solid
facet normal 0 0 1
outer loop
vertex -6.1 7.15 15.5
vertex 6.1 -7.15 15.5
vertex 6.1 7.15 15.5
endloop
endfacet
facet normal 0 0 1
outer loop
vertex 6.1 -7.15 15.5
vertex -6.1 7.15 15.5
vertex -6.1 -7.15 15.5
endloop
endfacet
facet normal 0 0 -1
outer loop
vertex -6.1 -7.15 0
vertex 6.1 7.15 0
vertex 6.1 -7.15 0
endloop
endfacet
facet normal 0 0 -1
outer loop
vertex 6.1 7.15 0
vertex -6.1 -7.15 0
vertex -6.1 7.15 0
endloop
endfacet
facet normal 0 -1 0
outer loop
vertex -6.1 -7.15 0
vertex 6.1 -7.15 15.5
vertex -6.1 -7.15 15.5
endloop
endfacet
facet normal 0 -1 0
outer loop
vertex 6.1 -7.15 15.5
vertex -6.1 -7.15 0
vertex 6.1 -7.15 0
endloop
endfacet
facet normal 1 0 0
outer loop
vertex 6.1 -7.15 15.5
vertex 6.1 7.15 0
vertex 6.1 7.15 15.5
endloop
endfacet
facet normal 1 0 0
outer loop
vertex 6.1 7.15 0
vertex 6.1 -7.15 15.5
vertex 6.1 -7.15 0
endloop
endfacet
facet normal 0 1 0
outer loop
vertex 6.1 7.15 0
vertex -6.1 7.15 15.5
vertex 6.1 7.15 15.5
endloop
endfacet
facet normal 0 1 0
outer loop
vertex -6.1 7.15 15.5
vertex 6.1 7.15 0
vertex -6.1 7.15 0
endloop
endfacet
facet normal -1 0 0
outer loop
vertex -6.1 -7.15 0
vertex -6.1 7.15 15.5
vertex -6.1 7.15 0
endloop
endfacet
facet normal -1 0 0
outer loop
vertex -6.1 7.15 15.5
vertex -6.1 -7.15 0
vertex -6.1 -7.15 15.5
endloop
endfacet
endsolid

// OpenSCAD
module centered_cube(cube_vector) {
    translate([-cube_vector[0] / 2, -cube_vector[1] / 2, 0]) {
        cube(cube_vector);
    }
}

module osa() {
    sirka_krabicky = 12.2;
    hloubka_krabicky = 14.3;
    vyska_krabicky = 15.5;
    
    centered_cube([sirka_krabicky, hloubka_krabicky, vyska_krabicky]);
}

osa();
